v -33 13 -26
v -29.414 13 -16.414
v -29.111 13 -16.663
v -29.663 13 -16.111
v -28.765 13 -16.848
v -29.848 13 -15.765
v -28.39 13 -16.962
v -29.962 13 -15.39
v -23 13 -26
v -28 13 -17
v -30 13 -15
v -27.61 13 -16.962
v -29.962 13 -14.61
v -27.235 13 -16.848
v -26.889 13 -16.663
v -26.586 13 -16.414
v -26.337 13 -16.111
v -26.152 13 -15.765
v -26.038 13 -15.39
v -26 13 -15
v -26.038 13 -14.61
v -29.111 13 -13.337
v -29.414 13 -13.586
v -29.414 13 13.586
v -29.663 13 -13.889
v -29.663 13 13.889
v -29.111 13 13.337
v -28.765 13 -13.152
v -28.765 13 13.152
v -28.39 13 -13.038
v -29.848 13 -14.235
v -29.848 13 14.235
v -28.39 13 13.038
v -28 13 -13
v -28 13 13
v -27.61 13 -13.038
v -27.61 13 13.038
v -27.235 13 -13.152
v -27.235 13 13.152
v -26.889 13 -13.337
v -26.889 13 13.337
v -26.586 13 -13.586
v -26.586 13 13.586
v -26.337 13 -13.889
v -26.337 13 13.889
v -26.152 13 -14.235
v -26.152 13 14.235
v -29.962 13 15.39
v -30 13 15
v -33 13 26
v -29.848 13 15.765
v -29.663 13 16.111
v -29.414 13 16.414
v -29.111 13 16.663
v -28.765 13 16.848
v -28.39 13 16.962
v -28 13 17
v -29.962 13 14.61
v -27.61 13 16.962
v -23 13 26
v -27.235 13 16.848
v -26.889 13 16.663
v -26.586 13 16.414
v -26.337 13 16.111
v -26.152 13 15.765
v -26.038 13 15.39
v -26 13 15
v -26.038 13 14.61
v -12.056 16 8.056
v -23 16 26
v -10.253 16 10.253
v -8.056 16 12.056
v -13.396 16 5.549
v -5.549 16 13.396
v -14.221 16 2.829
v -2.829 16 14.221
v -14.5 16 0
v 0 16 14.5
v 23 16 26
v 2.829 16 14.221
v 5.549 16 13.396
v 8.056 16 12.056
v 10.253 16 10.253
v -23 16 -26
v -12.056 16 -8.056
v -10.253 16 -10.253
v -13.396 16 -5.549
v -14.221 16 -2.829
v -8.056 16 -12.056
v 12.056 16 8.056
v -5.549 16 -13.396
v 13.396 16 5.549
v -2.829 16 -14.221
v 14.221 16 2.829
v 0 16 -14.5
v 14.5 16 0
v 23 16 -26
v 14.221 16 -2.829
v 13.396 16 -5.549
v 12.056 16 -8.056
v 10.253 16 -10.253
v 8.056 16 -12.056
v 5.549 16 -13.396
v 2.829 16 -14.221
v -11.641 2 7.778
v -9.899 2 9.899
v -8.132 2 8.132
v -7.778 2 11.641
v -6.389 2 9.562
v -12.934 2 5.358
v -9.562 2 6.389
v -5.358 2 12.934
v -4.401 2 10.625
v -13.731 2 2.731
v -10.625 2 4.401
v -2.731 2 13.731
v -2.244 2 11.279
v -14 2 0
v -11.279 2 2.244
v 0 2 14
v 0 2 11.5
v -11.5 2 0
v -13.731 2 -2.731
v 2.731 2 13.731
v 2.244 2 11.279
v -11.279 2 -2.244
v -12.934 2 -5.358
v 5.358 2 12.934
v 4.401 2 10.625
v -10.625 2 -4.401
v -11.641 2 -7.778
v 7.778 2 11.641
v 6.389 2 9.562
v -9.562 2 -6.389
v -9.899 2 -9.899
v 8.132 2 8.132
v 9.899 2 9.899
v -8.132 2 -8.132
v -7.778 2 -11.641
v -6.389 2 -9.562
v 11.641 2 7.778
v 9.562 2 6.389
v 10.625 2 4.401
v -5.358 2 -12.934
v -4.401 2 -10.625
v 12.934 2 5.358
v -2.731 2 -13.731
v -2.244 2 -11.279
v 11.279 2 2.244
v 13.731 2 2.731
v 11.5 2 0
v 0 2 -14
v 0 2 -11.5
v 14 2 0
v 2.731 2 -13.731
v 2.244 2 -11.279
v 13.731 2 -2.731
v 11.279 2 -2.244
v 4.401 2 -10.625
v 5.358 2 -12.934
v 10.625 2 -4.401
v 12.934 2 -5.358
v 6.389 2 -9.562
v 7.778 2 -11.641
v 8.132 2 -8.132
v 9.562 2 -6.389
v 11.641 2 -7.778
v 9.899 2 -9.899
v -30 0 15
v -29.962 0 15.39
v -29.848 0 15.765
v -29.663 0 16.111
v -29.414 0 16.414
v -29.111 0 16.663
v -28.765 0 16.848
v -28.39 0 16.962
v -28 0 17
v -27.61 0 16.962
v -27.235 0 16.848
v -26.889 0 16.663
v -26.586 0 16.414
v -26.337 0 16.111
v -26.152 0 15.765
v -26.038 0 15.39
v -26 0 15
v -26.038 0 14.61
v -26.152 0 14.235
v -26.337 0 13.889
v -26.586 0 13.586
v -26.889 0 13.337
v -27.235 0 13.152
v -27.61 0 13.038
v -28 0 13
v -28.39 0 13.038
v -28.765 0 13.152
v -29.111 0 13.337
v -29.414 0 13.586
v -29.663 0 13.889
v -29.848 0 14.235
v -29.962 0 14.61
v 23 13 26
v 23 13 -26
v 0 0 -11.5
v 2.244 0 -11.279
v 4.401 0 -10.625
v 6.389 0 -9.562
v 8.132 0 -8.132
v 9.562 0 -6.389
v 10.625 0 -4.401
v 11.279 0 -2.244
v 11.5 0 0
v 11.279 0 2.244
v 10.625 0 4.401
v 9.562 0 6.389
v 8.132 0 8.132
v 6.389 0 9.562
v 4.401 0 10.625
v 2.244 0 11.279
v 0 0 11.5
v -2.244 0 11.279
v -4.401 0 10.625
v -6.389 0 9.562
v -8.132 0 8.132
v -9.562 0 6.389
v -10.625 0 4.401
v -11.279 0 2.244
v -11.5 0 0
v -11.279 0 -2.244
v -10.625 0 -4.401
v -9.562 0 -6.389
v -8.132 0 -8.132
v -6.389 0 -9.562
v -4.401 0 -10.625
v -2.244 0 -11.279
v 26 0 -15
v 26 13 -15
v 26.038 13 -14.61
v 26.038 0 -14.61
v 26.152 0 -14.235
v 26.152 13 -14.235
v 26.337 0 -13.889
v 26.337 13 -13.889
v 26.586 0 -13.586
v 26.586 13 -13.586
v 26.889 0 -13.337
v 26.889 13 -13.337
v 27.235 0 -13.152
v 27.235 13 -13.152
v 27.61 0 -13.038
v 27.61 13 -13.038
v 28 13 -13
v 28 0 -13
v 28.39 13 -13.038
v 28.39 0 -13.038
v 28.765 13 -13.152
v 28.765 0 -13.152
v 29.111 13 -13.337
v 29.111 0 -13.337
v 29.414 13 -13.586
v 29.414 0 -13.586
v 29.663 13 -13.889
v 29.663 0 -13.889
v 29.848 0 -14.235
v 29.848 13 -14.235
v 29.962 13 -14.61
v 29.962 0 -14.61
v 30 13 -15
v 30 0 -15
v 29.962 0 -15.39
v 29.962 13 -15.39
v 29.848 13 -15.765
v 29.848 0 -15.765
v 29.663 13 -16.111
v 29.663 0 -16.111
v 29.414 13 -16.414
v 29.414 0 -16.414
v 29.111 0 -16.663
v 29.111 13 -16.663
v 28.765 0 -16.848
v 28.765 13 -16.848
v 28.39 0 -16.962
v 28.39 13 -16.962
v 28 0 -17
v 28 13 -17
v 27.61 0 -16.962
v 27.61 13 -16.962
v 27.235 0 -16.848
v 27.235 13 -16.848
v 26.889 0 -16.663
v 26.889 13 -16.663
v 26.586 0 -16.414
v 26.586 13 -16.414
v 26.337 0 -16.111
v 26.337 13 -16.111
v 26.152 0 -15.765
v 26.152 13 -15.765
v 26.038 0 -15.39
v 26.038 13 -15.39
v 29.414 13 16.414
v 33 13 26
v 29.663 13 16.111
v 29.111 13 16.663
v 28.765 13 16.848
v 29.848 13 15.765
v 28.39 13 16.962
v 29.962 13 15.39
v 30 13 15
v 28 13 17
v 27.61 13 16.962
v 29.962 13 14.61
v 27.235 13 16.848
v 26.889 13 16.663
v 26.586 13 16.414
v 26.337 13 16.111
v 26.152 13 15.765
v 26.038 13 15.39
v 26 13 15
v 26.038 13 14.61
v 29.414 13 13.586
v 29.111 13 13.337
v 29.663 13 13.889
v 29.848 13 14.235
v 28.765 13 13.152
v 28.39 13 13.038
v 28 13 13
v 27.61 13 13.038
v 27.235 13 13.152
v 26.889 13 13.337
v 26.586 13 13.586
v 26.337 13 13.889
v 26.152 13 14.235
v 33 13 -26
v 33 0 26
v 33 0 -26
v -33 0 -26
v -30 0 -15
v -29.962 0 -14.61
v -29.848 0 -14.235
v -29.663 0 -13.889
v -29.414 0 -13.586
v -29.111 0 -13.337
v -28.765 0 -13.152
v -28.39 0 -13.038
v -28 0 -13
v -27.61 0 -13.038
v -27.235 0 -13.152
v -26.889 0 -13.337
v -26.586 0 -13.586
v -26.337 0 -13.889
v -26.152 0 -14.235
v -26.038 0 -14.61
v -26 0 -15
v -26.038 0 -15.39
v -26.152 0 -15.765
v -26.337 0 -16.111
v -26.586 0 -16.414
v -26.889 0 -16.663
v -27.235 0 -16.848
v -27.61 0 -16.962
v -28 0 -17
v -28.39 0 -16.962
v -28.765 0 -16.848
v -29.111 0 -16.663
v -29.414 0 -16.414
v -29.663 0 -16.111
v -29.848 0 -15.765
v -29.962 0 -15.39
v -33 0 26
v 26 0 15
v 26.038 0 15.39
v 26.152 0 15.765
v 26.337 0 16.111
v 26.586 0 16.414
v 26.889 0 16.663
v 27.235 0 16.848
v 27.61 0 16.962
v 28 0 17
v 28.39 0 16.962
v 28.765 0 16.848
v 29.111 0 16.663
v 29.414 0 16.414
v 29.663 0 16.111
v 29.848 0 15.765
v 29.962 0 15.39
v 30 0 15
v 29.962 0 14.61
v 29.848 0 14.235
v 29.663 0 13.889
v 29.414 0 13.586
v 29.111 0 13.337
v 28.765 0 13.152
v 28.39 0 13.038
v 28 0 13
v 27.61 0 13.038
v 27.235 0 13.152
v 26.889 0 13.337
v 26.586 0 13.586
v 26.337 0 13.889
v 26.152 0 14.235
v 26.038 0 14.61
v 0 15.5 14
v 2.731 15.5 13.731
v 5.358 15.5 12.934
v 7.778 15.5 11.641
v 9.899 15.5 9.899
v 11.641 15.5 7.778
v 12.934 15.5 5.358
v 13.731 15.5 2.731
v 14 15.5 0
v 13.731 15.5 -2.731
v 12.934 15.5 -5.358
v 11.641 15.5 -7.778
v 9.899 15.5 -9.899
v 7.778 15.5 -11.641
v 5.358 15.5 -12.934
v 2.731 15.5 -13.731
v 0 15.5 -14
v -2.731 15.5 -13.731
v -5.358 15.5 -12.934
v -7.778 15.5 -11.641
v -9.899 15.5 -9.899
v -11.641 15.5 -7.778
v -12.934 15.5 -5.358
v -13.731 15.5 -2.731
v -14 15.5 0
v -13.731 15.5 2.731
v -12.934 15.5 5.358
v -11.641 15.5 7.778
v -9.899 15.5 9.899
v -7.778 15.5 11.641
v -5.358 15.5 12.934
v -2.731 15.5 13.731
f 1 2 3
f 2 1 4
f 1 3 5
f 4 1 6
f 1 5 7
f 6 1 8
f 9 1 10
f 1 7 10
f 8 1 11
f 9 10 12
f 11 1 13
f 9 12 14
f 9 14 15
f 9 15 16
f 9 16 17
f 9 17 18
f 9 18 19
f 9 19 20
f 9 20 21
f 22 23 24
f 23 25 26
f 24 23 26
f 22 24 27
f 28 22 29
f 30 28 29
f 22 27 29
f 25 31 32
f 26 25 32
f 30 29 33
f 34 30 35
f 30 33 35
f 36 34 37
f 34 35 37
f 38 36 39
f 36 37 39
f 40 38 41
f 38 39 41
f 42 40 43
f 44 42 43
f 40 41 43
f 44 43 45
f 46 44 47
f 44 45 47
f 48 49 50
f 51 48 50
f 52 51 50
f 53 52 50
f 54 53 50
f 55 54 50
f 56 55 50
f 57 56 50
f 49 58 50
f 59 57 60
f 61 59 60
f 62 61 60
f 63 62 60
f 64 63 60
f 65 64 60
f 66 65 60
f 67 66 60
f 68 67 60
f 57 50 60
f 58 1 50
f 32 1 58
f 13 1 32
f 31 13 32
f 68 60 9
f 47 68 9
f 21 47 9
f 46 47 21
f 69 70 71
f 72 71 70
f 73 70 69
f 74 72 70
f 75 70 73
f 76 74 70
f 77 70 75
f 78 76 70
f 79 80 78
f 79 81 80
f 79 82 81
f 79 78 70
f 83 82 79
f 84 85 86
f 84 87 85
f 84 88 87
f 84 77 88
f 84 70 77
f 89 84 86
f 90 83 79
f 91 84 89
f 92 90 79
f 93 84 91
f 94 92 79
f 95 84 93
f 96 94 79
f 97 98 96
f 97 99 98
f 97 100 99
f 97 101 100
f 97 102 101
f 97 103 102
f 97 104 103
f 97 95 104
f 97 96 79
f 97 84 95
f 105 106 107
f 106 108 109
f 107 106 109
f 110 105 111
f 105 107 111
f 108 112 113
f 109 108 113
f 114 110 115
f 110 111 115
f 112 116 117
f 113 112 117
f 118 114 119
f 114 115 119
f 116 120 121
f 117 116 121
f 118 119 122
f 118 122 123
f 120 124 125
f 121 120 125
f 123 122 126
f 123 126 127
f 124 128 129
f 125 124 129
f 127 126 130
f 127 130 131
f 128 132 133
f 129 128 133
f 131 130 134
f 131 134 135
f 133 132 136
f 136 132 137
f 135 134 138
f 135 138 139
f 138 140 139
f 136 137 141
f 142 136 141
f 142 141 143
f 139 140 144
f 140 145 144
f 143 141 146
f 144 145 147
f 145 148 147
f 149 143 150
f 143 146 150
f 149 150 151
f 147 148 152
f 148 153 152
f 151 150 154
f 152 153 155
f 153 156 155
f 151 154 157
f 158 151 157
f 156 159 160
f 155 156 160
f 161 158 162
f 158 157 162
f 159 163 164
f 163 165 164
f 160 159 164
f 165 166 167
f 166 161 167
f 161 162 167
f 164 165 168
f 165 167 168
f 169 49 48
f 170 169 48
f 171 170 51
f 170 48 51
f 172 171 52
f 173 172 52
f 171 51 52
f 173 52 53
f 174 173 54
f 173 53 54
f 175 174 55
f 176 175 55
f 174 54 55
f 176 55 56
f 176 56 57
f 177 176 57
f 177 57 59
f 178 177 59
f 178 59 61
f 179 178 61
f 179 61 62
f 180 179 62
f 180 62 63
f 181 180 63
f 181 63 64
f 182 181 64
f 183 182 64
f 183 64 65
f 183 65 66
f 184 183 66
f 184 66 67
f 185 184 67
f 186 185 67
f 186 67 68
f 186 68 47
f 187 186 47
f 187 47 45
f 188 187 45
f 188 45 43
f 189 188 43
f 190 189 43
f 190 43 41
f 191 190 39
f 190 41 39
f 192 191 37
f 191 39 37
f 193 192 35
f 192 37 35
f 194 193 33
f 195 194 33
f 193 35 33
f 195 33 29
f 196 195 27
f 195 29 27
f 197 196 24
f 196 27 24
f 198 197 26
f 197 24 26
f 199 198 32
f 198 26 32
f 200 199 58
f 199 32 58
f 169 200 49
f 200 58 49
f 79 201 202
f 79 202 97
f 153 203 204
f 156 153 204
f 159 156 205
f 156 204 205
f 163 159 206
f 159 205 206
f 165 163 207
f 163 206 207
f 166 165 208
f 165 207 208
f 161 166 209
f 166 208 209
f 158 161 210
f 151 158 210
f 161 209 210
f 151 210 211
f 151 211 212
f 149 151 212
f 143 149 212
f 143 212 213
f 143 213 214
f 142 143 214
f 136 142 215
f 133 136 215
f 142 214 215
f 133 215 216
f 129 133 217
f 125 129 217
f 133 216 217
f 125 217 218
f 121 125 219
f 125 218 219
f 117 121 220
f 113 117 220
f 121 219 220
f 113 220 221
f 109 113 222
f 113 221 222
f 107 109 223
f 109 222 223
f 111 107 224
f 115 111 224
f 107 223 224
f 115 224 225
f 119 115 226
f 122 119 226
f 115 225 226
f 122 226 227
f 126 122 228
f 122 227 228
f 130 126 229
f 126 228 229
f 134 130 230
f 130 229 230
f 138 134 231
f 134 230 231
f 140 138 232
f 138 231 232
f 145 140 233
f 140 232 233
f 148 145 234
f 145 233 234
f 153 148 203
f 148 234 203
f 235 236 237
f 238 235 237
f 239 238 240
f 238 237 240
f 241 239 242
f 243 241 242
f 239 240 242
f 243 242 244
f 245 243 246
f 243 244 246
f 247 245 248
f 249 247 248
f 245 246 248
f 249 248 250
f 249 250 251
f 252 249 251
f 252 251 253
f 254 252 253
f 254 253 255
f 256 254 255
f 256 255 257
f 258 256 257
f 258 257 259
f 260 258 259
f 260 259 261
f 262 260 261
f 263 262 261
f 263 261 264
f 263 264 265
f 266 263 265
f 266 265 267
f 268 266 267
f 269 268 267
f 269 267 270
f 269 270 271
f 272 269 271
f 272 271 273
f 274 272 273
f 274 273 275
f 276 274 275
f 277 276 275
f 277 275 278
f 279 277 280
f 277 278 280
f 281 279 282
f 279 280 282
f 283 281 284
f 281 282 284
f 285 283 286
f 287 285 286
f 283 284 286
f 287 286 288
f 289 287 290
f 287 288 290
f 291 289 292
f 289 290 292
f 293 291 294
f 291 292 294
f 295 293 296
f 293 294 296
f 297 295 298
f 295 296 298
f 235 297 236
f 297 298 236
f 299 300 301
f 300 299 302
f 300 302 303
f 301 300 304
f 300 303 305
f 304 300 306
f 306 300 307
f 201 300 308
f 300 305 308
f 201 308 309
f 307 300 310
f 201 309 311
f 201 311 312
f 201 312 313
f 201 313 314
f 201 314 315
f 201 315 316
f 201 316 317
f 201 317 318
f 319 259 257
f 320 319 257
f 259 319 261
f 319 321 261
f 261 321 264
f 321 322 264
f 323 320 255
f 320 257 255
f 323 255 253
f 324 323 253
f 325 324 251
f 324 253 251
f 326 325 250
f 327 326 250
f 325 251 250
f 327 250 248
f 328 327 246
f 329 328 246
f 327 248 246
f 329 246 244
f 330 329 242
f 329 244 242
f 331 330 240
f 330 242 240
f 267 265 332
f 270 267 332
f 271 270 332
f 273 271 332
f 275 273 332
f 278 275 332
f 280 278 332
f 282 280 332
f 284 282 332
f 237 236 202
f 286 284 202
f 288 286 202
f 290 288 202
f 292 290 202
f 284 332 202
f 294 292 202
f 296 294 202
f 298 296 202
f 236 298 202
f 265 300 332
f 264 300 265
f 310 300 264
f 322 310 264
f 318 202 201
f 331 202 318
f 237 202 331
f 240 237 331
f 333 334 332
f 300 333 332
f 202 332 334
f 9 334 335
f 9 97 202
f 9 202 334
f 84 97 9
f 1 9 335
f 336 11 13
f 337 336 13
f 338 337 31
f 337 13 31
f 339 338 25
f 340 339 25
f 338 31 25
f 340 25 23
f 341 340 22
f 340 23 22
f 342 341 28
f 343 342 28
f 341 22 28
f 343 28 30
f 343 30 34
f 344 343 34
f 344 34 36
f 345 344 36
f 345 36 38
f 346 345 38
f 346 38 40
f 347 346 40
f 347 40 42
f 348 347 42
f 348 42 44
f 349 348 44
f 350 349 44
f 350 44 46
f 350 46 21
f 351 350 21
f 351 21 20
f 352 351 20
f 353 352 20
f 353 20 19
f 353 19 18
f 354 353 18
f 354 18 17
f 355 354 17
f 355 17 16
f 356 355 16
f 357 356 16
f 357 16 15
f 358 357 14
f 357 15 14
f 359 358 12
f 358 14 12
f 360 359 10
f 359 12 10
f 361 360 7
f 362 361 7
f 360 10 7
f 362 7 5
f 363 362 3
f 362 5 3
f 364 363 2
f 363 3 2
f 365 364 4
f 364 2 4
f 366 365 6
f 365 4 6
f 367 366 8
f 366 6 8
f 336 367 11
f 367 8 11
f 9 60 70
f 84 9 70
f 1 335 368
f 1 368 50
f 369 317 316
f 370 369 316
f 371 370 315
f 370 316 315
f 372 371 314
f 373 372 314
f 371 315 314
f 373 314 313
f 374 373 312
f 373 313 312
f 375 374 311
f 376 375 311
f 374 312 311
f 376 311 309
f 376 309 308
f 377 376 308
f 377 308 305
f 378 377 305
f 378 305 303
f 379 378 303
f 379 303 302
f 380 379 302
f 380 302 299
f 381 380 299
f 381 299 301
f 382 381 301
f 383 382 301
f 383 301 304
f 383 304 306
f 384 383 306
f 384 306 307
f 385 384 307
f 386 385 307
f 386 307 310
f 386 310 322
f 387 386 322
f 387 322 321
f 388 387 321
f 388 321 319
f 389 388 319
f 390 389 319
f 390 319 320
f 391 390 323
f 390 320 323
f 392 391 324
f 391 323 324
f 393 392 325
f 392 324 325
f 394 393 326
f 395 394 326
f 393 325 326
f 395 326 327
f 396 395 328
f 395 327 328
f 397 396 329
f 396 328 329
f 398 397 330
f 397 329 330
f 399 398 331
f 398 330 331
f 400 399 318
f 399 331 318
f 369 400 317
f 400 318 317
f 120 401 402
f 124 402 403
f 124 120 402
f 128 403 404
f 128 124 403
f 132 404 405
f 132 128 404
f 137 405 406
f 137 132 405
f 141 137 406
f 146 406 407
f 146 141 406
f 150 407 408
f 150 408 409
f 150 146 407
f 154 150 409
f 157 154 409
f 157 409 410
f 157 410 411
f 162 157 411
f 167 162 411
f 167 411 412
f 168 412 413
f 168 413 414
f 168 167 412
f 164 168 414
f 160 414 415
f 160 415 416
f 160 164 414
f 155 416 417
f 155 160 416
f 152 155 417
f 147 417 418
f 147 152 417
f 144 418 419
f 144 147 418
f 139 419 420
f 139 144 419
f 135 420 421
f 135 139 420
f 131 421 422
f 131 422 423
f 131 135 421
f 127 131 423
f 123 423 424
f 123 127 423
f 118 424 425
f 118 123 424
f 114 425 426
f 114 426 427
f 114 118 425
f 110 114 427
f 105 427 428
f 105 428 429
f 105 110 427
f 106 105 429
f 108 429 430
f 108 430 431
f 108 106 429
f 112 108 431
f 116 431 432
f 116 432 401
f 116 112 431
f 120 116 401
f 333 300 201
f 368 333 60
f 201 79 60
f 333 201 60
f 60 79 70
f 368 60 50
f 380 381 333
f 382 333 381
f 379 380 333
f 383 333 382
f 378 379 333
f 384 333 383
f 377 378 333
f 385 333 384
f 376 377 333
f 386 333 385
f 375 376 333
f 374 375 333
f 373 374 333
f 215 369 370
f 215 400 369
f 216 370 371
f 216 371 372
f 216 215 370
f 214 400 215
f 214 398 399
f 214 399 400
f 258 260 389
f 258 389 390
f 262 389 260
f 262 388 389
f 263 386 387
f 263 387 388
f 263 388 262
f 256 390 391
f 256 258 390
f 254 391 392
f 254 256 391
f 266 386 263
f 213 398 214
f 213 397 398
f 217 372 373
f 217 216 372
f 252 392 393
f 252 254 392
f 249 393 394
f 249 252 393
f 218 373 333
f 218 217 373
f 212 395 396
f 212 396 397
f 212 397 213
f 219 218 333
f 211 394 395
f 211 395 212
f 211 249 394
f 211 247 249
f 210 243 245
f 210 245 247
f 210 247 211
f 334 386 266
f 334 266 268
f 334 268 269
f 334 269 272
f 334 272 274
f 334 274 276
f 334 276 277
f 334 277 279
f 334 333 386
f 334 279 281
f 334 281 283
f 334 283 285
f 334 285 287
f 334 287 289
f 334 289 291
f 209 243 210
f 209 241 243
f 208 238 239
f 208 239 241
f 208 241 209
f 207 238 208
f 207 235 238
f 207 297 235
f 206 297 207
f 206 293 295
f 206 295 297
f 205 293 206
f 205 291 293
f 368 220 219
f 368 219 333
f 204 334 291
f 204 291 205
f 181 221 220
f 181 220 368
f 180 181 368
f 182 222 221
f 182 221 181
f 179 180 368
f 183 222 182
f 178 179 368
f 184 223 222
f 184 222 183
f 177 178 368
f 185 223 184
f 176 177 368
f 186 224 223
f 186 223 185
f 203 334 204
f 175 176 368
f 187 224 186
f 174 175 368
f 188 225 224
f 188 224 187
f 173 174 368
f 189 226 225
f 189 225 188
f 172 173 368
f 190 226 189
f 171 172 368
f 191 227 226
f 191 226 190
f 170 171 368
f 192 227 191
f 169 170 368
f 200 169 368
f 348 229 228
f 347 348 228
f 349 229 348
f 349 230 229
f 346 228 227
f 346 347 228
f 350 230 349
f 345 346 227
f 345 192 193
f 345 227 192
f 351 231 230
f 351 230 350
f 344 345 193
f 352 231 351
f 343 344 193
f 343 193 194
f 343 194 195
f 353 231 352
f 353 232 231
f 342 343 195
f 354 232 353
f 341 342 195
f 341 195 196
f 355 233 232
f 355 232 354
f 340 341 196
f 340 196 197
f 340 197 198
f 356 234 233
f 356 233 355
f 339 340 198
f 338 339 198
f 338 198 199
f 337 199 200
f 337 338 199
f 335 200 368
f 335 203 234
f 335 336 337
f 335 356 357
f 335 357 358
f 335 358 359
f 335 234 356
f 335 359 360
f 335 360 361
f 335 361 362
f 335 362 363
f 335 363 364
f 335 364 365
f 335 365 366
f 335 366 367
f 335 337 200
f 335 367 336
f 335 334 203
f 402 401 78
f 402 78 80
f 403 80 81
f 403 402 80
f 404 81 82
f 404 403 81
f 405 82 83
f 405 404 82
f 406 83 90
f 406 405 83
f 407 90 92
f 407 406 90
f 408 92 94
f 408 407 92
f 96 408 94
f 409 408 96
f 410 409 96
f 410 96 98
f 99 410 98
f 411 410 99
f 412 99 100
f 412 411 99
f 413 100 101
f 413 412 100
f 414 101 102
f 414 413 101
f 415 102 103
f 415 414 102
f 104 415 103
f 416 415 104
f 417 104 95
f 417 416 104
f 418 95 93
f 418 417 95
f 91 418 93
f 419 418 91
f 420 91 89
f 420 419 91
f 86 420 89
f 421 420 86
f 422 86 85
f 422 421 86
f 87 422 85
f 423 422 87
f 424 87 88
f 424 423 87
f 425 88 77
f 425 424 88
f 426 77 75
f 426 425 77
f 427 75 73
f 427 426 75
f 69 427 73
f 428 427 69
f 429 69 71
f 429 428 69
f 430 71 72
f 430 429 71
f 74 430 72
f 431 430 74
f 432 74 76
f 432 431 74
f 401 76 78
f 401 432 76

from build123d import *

# Parameters (mm, degrees)
SKETCH_1_W          = 50
SKETCH_1_H          = 52
SKETCH_1_R          = 14
EXTRUDE_1_DEPTH     = 16
SKETCH_2_R          = 14
SKETCH_2_R_2        = 11.5
EXTRUDE_2_DEPTH     = 2
SKETCH_3_W          = 8
SKETCH_3_H          = 13
EXTRUDE_3_DEPTH     = 52
SKETCH_4_R          = 2
CUT_EXTRUDE_1_DEPTH = 44.977266855
CHAMFER_1_SIZE      = 0.5
SKETCH_5_W          = 2
SKETCH_5_H          = 3
CUT_EXTRUDE_2_DEPTH = 64.63175308


with BuildPart() as part:
    # 草图1 → 凸台-拉伸1 (new body)
    with BuildSketch(Plane(origin=(0, 0, 0), x_dir=(1, 0, 0), z_dir=(0, 1, 0))):
        Rectangle(SKETCH_1_W, SKETCH_1_H)
        with Locations(Location((0, 0, 0), (0, 0, 270))):
            Circle(SKETCH_1_R, mode=Mode.SUBTRACT)
    extrude(amount=EXTRUDE_1_DEPTH)

    # 草图2 → 凸台-拉伸2 (add)
    with BuildSketch(Plane.XZ):
        with Locations(Location((0, 0, 0), (0, 0, 270))):
            Circle(SKETCH_2_R)
        with Locations(Location((0, 0, 0), (0, 0, 270))):
            Circle(SKETCH_2_R_2, mode=Mode.SUBTRACT)
    extrude(amount=-EXTRUDE_2_DEPTH)

    # 草图3 → 凸台-拉伸3 (add)
    with BuildSketch(Plane(origin=(0, 0, -26), x_dir=(-1, 0, 0), z_dir=(0, 0, -1))):
        with Locations((-29, 6.5)):
            Rectangle(SKETCH_3_W, SKETCH_3_H)
        with Locations((29, 6.5)):
            Rectangle(SKETCH_3_W, SKETCH_3_H)
    extrude(amount=-EXTRUDE_3_DEPTH)

    # 草图4 → 切除-拉伸1 (cut, through all)
    with BuildSketch(Plane(origin=(0, 13, 0), x_dir=(1, 0, 0), z_dir=(0, 1, 0))):
        with Locations(Location((-28, 15, 0), (0, 0, 180))):
            Circle(SKETCH_4_R)
        with Locations(Location((-28, -15, 0), (0, 0, 180))):
            Circle(SKETCH_4_R)
        with Locations(Location((28, 15, 0), (0, 0, 180))):
            Circle(SKETCH_4_R)
        with Locations(Location((28, -15, 0), (0, 0, 180))):
            Circle(SKETCH_4_R)
    extrude(amount=-CUT_EXTRUDE_1_DEPTH, mode=Mode.SUBTRACT)

    # 倒角1
    chamfer_1_edges = [part.edges().sort_by_distance(p)[0] for p in [
        (0, 16, -14),
    ]]
    chamfer(chamfer_1_edges, length=CHAMFER_1_SIZE)

    # 草图5 → 切除-拉伸2 (cut, through all)
    with BuildSketch(Plane.XY.offset(26)):
        with Locations((-24, 14.5)):
            Rectangle(SKETCH_5_W, SKETCH_5_H)
        with Locations((24, 14.5)):
            Rectangle(SKETCH_5_W, SKETCH_5_H)
    extrude(amount=-CUT_EXTRUDE_2_DEPTH, mode=Mode.SUBTRACT)


solid = part.part
